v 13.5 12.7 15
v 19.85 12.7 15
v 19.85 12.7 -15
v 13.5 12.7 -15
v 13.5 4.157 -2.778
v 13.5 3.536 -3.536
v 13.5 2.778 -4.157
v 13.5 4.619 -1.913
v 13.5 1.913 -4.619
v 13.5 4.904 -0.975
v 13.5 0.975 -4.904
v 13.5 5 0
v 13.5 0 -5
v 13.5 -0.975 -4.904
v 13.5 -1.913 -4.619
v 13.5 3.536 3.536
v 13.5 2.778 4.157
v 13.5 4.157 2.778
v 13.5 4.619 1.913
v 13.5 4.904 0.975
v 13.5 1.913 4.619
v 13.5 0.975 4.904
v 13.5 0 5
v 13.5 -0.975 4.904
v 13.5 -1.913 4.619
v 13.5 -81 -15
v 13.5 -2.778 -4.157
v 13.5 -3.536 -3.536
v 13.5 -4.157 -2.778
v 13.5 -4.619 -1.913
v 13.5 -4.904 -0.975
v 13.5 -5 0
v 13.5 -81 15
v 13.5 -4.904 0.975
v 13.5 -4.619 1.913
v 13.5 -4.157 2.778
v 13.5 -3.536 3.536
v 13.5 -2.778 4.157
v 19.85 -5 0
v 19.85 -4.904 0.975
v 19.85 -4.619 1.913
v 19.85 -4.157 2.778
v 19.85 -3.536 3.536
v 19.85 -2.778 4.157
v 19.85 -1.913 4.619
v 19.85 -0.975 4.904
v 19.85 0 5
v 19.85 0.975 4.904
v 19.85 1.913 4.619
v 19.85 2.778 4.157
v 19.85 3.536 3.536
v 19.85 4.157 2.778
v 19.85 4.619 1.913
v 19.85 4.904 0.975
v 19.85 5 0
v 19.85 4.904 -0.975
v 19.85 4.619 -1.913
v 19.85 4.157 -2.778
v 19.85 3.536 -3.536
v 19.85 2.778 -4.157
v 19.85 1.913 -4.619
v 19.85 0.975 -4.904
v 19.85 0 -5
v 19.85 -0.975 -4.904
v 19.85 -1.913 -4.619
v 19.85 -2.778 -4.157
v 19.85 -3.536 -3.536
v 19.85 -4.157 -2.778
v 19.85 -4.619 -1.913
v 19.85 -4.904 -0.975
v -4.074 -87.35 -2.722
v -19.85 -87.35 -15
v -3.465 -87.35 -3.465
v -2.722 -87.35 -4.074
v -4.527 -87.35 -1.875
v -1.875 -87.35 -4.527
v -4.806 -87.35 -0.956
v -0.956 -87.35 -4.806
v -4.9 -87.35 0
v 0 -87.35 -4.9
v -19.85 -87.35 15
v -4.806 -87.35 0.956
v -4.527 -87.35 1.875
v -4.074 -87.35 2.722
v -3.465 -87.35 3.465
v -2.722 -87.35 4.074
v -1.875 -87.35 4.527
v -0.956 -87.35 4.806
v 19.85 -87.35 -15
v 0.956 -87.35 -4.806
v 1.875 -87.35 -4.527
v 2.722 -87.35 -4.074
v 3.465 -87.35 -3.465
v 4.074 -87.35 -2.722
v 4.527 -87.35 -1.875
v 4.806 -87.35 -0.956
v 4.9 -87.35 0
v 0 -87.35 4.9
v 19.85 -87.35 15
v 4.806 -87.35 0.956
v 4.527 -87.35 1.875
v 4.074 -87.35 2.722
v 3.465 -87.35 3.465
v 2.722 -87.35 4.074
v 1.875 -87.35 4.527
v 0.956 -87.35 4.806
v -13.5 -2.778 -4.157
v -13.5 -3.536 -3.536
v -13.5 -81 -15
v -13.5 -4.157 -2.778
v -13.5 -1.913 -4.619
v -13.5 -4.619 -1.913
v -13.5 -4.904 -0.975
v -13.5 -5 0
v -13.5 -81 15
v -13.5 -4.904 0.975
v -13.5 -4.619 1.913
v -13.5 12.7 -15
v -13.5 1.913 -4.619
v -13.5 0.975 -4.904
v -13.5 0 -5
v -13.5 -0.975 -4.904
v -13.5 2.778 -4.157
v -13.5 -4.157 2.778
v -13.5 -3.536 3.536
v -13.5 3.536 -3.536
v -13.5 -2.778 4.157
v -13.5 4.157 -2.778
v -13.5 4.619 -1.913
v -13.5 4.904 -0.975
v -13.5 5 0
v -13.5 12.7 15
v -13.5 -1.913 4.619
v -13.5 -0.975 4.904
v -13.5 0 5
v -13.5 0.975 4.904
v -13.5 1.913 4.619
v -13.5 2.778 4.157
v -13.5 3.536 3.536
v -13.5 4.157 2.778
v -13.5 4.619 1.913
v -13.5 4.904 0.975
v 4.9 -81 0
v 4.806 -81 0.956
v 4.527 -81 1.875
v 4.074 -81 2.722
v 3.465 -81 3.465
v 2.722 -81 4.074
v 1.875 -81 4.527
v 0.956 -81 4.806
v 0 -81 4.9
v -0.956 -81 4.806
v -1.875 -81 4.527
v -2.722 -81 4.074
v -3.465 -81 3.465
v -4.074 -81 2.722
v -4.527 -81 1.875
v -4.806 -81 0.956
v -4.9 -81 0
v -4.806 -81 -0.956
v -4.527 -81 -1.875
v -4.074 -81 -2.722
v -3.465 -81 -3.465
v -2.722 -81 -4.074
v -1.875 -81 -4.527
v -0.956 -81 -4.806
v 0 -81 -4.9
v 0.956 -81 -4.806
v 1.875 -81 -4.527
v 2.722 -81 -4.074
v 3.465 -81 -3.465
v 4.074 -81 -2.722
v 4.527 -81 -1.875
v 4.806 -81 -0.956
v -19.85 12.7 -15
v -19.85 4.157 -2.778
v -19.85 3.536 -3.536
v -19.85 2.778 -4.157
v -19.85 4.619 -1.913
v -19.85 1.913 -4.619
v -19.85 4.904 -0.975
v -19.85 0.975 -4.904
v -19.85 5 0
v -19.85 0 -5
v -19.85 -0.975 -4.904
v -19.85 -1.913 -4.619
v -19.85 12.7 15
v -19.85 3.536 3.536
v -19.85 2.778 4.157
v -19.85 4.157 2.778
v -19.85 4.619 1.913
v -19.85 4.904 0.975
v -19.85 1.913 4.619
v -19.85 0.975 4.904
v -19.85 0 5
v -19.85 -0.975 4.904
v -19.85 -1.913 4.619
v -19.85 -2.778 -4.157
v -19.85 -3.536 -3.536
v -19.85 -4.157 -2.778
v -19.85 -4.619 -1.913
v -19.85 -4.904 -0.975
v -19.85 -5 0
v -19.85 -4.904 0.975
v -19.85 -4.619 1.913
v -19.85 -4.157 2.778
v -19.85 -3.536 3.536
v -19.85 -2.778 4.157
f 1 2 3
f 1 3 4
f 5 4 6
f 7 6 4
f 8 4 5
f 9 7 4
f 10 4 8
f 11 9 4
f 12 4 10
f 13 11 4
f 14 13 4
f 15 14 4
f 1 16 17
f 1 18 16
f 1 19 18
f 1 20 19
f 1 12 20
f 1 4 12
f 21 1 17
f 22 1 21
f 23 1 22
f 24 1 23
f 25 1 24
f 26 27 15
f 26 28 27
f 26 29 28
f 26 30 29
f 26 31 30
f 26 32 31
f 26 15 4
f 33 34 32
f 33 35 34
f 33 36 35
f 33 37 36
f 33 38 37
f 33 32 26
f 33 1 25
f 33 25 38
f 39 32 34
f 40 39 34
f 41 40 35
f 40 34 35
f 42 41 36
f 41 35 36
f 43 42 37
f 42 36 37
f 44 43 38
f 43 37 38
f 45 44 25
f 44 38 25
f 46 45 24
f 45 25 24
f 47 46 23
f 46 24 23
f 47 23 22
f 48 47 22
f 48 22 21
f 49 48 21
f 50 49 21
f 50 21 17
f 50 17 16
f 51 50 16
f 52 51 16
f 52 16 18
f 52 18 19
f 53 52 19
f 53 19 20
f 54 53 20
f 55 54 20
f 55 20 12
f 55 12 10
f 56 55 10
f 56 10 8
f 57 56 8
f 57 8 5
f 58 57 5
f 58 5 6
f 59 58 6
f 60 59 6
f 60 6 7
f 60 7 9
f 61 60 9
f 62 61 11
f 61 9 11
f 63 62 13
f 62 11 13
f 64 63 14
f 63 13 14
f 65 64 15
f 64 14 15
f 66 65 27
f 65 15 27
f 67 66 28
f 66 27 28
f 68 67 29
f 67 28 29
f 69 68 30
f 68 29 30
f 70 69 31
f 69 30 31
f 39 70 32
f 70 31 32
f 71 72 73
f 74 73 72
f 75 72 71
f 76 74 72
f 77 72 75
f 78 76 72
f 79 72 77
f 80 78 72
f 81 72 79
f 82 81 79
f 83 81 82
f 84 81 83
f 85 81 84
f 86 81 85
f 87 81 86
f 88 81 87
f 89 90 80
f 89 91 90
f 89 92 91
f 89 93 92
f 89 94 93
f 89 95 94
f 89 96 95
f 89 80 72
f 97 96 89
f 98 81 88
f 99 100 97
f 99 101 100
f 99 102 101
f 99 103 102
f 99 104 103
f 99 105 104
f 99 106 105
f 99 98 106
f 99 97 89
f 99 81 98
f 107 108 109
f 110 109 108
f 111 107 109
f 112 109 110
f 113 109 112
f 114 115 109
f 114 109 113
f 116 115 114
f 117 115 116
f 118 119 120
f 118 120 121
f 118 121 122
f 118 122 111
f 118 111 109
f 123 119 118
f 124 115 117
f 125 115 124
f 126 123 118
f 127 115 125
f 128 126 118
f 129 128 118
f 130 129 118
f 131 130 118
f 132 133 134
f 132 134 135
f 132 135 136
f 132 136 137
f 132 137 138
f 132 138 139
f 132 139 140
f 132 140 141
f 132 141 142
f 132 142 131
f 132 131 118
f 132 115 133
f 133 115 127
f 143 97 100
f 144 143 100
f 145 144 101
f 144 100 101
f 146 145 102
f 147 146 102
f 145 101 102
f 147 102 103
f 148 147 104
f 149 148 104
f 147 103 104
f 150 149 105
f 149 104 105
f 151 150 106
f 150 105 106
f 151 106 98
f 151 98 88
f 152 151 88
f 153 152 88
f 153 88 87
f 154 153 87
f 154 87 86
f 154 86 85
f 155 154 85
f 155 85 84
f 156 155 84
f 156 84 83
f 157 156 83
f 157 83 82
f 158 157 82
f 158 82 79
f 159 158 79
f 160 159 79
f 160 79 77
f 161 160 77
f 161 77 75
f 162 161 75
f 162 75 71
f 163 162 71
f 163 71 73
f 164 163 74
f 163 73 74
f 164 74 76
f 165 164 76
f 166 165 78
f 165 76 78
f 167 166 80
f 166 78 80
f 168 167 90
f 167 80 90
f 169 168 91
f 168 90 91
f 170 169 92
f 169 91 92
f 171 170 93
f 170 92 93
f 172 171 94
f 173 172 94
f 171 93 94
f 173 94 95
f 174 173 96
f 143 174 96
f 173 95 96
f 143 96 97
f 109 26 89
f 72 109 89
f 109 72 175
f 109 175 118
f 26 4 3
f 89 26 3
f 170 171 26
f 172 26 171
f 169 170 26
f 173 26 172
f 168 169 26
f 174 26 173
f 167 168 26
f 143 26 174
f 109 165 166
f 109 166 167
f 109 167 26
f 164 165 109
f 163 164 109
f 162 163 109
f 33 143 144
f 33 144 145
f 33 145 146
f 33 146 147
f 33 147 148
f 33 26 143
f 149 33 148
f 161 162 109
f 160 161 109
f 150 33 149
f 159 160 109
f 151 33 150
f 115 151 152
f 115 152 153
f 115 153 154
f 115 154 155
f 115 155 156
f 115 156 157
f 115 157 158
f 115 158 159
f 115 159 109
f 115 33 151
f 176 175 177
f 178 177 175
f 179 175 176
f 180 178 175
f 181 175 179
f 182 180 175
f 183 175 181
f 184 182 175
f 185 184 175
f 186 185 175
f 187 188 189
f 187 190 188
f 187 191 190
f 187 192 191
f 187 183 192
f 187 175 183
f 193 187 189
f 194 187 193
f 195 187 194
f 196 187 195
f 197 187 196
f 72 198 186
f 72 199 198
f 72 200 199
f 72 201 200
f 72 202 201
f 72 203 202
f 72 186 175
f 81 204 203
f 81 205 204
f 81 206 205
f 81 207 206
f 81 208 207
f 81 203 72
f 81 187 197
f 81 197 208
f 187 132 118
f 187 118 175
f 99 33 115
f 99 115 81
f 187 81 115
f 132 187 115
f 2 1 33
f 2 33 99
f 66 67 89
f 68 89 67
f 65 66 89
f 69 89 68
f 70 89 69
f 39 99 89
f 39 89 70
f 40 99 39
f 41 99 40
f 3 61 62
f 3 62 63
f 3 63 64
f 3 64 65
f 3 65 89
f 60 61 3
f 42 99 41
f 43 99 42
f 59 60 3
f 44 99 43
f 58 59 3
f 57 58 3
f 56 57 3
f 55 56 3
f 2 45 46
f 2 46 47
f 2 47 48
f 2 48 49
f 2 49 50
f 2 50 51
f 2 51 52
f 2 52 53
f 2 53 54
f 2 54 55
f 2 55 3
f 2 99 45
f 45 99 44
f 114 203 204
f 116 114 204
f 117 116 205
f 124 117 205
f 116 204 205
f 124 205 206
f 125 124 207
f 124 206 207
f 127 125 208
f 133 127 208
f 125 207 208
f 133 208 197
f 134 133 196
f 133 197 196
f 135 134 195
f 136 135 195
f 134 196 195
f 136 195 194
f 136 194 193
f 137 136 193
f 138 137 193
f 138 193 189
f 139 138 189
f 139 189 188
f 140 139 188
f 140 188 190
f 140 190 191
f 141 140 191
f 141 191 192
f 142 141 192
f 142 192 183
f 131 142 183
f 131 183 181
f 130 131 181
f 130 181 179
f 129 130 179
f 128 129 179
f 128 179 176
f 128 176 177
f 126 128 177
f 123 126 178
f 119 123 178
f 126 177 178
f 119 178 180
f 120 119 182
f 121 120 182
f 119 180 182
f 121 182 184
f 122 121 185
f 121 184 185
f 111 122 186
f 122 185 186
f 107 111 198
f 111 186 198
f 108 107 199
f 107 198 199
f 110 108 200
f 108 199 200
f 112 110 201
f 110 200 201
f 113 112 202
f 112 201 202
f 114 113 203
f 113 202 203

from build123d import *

# Parameters (mm, degrees)
SALIENTE_EXTRUIR1_DEPTH = 15
CROQUIS2_R              = 5
CORTAR_EXTRUIR1_DEPTH   = 60
CROQUIS3_R              = 4.9
CORTAR_EXTRUIR2_DEPTH   = 60


with BuildPart() as part:
    # Croquis1 → Saliente-Extruir1 (new, symmetric)
    with BuildSketch(Plane.XY):
        Polygon((-13.5, -81), (-13.5, 12.7), (-19.85, 12.7), (-19.85, -87.35), (0, -87.35), (0, -81), align=None)
        Polygon((13.5, -81), (0, -81), (0, -87.35), (19.85, -87.35), (19.85, 12.7), (13.5, 12.7), align=None)
    extrude(amount=SALIENTE_EXTRUIR1_DEPTH, both=True)

    # Croquis2 → Cortar-Extruir1 (cut)
    with BuildSketch(Plane.ZY.offset(19.85)):
        with Locations(Location((0, 0, 0), (0, 0, 270))):
            Circle(CROQUIS2_R)
    extrude(amount=-CORTAR_EXTRUIR1_DEPTH, mode=Mode.SUBTRACT)

    # Croquis3 → Cortar-Extruir2 (cut)
    with BuildSketch(Plane.XZ.offset(87.35)):
        Circle(CROQUIS3_R)
    extrude(amount=-CORTAR_EXTRUIR2_DEPTH, mode=Mode.SUBTRACT)


solid = part.part
